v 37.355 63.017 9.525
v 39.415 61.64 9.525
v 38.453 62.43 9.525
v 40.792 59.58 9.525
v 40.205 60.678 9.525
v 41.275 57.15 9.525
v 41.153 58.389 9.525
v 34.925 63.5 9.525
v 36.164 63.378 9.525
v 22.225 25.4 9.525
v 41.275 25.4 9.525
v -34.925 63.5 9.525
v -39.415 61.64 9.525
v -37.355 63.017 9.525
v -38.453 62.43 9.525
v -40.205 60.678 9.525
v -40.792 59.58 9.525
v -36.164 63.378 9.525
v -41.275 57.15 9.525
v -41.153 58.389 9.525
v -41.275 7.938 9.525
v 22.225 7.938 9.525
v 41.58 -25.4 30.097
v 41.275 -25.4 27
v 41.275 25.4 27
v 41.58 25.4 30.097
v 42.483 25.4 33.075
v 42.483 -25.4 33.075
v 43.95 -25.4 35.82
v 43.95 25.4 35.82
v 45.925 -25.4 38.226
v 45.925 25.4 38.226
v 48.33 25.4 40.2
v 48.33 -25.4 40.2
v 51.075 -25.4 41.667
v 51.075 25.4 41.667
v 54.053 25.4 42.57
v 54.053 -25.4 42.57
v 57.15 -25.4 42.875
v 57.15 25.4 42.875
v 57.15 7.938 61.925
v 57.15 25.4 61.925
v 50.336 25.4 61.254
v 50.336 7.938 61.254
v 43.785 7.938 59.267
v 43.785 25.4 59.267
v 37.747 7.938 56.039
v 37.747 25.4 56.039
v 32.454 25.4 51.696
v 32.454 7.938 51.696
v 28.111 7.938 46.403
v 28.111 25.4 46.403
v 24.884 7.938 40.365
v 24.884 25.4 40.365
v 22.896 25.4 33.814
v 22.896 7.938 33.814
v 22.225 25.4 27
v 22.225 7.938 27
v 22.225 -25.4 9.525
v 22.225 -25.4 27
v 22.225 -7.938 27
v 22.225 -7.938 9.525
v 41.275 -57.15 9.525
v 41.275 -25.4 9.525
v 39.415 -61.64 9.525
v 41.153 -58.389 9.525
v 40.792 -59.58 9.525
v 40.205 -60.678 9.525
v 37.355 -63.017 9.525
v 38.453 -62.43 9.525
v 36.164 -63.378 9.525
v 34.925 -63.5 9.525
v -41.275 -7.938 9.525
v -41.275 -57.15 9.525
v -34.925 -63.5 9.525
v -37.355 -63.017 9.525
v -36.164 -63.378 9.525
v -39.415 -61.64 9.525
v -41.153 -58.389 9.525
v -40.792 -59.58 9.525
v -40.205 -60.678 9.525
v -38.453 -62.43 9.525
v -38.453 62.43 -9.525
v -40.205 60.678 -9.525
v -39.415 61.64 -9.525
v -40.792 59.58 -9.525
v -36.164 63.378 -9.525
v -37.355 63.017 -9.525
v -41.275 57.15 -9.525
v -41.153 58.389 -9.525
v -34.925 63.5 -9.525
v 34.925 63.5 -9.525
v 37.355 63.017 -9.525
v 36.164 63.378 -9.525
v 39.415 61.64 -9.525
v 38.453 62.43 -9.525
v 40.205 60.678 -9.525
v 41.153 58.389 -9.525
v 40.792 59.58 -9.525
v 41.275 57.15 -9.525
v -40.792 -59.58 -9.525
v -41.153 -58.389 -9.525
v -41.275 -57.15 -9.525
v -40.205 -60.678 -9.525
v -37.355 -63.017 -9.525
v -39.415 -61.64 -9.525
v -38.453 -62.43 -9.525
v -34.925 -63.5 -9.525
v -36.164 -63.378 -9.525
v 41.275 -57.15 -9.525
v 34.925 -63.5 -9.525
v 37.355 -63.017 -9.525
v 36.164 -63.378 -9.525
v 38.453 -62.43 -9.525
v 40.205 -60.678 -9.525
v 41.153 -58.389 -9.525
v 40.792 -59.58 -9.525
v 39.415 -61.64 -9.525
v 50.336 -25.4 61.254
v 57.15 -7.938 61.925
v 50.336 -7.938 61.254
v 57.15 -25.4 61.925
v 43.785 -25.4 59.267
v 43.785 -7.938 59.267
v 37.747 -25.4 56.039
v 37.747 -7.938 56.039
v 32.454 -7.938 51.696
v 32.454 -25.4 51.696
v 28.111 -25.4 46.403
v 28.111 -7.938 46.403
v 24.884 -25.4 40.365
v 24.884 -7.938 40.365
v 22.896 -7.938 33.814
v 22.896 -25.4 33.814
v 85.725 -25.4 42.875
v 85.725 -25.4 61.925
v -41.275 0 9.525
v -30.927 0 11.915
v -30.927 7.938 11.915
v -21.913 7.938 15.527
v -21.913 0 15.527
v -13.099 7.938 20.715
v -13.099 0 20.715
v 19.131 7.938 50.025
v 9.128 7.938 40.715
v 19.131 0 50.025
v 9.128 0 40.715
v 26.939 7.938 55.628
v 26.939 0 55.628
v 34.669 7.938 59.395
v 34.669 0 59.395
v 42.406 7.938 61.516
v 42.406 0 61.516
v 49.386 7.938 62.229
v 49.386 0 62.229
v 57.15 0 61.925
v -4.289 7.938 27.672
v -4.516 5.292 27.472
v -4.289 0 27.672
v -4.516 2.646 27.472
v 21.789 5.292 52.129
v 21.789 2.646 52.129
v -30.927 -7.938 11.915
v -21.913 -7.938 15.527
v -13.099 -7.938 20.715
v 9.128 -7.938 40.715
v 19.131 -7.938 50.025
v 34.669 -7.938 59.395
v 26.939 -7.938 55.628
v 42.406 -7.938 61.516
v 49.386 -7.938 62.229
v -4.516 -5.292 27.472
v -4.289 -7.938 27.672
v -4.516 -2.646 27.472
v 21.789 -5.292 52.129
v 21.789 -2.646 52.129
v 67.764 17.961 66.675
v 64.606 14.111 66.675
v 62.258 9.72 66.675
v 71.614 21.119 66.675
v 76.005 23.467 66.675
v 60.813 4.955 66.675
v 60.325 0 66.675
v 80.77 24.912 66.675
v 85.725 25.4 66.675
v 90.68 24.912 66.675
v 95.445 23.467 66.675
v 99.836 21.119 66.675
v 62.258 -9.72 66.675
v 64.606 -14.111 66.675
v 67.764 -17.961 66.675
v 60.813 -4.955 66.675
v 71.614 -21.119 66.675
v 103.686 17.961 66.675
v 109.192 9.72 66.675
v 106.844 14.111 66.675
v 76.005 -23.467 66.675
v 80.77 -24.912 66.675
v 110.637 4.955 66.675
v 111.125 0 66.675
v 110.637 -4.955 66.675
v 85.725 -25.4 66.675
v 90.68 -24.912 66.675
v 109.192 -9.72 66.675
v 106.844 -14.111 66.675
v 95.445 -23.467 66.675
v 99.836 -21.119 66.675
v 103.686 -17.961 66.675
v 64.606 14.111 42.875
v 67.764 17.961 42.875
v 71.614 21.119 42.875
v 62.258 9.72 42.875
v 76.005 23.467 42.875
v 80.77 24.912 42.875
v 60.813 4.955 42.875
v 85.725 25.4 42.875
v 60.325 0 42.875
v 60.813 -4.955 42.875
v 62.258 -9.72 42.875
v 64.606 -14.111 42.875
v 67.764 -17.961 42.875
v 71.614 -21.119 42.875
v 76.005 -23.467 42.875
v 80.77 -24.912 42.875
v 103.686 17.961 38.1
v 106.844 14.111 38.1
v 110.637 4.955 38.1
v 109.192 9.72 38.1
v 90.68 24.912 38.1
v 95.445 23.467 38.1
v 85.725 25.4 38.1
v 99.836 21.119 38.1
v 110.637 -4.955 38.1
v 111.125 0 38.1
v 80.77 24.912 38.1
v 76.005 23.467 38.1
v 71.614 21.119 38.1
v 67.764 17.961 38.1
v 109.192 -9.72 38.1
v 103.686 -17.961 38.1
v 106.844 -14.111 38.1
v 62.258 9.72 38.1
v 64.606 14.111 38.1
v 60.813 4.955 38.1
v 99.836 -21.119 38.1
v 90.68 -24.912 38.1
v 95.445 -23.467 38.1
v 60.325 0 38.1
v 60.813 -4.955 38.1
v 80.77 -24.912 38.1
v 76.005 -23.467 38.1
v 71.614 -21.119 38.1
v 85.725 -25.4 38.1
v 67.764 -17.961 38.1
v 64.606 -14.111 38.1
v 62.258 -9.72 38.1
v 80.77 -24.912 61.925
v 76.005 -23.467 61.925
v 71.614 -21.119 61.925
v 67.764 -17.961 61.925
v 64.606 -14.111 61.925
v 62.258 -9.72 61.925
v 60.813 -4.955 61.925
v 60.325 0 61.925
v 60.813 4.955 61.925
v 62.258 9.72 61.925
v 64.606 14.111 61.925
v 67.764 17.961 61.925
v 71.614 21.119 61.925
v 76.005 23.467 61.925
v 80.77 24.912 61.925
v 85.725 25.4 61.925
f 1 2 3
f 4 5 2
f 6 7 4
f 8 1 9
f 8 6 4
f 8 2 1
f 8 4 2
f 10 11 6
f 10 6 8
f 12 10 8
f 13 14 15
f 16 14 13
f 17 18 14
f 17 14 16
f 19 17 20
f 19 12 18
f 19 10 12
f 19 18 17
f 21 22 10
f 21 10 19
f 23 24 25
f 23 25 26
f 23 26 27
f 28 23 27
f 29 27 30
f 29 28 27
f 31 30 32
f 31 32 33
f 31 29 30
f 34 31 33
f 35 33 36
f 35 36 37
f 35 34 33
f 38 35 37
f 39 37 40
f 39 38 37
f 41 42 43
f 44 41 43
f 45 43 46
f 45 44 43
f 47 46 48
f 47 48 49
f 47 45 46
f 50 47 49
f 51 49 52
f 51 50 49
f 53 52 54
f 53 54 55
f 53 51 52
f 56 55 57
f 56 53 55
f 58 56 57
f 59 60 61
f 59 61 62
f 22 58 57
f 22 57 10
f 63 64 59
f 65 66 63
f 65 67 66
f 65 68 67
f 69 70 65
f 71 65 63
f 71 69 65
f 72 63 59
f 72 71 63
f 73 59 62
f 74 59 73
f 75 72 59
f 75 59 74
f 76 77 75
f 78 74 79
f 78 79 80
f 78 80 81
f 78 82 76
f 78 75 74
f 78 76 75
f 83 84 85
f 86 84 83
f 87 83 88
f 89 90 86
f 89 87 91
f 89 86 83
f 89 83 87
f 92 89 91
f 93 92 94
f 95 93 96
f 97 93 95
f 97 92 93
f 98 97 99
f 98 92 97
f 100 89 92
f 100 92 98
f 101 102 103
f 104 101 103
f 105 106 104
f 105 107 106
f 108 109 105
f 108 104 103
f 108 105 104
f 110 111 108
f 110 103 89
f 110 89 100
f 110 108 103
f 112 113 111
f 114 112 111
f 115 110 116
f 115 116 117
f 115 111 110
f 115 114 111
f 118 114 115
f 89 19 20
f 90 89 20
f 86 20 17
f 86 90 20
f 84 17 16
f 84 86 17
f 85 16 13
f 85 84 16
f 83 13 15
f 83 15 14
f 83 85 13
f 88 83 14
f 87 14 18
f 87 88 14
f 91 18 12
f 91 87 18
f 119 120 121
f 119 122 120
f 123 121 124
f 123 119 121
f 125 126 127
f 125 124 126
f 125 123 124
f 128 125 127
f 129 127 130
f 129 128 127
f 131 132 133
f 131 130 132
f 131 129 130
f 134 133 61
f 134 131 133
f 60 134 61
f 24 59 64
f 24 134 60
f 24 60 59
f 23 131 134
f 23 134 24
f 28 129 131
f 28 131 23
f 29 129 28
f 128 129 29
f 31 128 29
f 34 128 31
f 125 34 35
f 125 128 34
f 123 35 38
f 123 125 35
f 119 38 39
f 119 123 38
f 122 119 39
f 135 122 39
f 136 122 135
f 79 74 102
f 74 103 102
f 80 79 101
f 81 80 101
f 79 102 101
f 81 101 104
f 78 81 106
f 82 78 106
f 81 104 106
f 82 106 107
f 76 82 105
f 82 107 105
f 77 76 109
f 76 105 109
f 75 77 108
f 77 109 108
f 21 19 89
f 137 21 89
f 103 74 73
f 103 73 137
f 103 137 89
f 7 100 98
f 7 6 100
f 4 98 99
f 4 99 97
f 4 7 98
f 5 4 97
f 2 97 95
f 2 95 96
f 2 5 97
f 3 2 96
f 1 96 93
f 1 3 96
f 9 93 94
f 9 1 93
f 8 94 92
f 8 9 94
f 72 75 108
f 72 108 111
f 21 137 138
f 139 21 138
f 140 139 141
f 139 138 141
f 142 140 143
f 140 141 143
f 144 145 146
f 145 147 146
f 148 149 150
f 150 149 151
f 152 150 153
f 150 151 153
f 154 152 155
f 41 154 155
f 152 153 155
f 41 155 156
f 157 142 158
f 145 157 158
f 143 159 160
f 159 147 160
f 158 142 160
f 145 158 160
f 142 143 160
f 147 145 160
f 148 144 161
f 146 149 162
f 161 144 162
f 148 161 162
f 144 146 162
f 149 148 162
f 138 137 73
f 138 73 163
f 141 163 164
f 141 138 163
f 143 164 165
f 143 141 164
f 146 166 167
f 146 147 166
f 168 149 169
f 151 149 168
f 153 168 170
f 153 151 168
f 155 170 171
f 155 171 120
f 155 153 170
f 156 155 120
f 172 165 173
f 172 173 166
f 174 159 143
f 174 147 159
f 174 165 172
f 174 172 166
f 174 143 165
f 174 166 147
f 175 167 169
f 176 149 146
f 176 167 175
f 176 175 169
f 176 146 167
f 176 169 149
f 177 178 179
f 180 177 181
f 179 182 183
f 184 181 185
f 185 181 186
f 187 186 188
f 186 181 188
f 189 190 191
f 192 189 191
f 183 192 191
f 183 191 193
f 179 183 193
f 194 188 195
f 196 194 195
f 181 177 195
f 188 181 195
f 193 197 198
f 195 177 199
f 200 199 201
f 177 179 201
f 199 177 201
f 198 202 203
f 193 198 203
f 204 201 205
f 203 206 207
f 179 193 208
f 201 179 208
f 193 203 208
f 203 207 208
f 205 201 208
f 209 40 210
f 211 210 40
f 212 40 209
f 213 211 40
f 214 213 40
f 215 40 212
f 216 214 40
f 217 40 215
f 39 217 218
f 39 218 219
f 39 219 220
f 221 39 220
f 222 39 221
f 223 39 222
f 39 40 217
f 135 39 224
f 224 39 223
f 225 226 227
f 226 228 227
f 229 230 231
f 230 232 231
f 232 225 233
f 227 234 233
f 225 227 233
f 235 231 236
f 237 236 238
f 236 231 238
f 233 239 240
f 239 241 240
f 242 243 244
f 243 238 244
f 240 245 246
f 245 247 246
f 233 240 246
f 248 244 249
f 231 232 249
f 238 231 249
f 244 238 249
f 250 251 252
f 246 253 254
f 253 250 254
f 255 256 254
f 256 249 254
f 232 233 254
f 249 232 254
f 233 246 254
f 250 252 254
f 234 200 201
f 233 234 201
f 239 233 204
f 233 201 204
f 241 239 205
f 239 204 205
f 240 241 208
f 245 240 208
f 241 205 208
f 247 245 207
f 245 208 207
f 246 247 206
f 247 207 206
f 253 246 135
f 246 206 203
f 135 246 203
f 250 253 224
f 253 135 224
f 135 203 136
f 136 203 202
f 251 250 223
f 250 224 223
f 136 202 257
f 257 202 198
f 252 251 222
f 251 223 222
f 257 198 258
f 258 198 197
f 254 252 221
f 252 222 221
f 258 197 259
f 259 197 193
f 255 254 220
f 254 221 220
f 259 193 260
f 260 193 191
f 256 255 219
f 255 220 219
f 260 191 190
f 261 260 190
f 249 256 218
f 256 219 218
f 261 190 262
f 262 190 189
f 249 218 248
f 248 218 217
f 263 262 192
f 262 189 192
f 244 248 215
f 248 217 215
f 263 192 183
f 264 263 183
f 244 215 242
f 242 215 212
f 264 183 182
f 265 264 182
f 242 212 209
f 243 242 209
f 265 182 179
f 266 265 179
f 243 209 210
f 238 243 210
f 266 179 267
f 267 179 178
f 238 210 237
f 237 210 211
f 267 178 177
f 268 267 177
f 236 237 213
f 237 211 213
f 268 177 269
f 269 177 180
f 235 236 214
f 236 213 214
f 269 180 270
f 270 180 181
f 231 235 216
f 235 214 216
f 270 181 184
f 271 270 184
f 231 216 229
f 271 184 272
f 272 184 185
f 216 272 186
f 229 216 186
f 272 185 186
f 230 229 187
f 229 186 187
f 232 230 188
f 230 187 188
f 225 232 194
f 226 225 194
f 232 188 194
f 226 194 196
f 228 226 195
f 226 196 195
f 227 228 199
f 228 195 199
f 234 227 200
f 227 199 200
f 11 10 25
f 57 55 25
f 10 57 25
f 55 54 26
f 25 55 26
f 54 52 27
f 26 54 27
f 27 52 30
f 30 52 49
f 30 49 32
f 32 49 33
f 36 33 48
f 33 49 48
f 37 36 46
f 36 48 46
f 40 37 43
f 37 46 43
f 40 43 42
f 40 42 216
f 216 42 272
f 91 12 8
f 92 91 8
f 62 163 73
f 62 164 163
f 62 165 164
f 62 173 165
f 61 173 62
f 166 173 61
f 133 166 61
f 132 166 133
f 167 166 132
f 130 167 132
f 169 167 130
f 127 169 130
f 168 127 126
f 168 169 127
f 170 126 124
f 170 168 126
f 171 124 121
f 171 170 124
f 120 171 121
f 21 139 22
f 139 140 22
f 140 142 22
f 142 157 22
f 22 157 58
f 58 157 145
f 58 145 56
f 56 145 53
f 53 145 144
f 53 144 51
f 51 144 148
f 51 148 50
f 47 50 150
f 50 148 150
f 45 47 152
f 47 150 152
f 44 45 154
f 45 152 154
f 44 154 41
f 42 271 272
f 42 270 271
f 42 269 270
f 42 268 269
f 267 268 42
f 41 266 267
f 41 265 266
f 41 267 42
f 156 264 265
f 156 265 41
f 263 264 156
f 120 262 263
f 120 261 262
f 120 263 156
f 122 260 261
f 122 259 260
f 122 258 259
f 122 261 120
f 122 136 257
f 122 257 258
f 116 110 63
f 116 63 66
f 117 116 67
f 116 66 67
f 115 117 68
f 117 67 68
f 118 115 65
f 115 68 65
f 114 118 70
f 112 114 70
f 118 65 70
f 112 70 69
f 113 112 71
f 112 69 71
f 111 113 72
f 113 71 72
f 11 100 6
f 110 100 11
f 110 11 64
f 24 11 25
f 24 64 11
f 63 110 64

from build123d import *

# Parameters (mm, degrees)
F1_DEPTH = 63.5
F0_W     = 25.4
F0_H     = 19.05
F2_DEPTH = 25.4
F3_DEPTH = 7.9375
F5_R     = 6.35


# Not quite as in the source:
# - a feature names something its author has since deleted; it is built from what else it names


with BuildPart() as f1:
    # F0 (on Front) → F1 (new body, symmetric)
    with BuildSketch(Plane.XZ):
        Polygon((41.275, -9.525), (41.275, 9.525), (22.225, 9.525), (-41.275, 9.525), (-41.275, -9.525), align=None)
    extrude(amount=F1_DEPTH, both=True)

    # F0 (on Front) → F2 (join, symmetric)
    with BuildSketch(Plane.XZ):
        with BuildLine():
            Line((22.225, 9.525), (41.275, 9.525))
            Line((41.275, 9.525), (41.275, 27.0002))
            ThreePointArc((41.275, 27.0002), (45.9246798487, 38.2255201513), (57.15, 42.8752))
            Line((57.15, 42.8752), (60.325, 42.8752))
            Line((60.325, 42.8752), (60.325, 61.9252))
            Line((60.325, 61.9252), (57.15, 61.9252))
            ThreePointArc((57.15, 61.9252), (32.4542956671, 51.6959043329), (22.225, 27.0002))
            Line((22.225, 27.0002), (22.225, 9.525))
        make_face()
        with Locations((73.025, 52.4002)):
            Rectangle(F0_W, F0_H)
    extrude(amount=F2_DEPTH, both=True)

    # F0 (on Front) → F3 (join, symmetric)
    with BuildSketch(Plane.XZ):
        with BuildLine():
            Line((-41.275, 9.525), (22.225, 9.525))
            Line((22.225, 9.525), (22.225, 27.0002))
            ThreePointArc((22.225, 27.0002), (32.4542956671, 51.6959043329), (57.15, 61.9252))
            add(Edge.make_bspline(
                [(-41.275, 9.525), (7.2152586654, 16.9252250344), (10.756178759, 66.7510330677), (57.15, 61.9252)],
                knots=[0, 0, 0, 0, 111.5045361635, 111.5045361635, 111.5045361635, 111.5045361635], degree=3))
        make_face()
    extrude(amount=F3_DEPTH, both=True)

    # F0 (on Front) → F4 (revolve)
    with BuildSketch(Plane.XZ):
        Polygon((85.725, 61.9252), (85.725, 42.8752), (85.725, 38.1), (111.125, 38.1), (111.125, 66.675), (85.725, 66.675), align=None)
    revolve(axis=Axis((85.725, 0, 52.3875), (0, 0, -1)))

    # F5
    f5_edges = [f1.edges().sort_by_distance(p)[0] for p in [
        (41.275, -63.5, 0),
        (-41.275, -63.5, 0),
        (41.275, 63.5, 0),
        (-41.275, 63.5, 0),
    ]]
    fillet(f5_edges, radius=F5_R)


solid = f1.part
